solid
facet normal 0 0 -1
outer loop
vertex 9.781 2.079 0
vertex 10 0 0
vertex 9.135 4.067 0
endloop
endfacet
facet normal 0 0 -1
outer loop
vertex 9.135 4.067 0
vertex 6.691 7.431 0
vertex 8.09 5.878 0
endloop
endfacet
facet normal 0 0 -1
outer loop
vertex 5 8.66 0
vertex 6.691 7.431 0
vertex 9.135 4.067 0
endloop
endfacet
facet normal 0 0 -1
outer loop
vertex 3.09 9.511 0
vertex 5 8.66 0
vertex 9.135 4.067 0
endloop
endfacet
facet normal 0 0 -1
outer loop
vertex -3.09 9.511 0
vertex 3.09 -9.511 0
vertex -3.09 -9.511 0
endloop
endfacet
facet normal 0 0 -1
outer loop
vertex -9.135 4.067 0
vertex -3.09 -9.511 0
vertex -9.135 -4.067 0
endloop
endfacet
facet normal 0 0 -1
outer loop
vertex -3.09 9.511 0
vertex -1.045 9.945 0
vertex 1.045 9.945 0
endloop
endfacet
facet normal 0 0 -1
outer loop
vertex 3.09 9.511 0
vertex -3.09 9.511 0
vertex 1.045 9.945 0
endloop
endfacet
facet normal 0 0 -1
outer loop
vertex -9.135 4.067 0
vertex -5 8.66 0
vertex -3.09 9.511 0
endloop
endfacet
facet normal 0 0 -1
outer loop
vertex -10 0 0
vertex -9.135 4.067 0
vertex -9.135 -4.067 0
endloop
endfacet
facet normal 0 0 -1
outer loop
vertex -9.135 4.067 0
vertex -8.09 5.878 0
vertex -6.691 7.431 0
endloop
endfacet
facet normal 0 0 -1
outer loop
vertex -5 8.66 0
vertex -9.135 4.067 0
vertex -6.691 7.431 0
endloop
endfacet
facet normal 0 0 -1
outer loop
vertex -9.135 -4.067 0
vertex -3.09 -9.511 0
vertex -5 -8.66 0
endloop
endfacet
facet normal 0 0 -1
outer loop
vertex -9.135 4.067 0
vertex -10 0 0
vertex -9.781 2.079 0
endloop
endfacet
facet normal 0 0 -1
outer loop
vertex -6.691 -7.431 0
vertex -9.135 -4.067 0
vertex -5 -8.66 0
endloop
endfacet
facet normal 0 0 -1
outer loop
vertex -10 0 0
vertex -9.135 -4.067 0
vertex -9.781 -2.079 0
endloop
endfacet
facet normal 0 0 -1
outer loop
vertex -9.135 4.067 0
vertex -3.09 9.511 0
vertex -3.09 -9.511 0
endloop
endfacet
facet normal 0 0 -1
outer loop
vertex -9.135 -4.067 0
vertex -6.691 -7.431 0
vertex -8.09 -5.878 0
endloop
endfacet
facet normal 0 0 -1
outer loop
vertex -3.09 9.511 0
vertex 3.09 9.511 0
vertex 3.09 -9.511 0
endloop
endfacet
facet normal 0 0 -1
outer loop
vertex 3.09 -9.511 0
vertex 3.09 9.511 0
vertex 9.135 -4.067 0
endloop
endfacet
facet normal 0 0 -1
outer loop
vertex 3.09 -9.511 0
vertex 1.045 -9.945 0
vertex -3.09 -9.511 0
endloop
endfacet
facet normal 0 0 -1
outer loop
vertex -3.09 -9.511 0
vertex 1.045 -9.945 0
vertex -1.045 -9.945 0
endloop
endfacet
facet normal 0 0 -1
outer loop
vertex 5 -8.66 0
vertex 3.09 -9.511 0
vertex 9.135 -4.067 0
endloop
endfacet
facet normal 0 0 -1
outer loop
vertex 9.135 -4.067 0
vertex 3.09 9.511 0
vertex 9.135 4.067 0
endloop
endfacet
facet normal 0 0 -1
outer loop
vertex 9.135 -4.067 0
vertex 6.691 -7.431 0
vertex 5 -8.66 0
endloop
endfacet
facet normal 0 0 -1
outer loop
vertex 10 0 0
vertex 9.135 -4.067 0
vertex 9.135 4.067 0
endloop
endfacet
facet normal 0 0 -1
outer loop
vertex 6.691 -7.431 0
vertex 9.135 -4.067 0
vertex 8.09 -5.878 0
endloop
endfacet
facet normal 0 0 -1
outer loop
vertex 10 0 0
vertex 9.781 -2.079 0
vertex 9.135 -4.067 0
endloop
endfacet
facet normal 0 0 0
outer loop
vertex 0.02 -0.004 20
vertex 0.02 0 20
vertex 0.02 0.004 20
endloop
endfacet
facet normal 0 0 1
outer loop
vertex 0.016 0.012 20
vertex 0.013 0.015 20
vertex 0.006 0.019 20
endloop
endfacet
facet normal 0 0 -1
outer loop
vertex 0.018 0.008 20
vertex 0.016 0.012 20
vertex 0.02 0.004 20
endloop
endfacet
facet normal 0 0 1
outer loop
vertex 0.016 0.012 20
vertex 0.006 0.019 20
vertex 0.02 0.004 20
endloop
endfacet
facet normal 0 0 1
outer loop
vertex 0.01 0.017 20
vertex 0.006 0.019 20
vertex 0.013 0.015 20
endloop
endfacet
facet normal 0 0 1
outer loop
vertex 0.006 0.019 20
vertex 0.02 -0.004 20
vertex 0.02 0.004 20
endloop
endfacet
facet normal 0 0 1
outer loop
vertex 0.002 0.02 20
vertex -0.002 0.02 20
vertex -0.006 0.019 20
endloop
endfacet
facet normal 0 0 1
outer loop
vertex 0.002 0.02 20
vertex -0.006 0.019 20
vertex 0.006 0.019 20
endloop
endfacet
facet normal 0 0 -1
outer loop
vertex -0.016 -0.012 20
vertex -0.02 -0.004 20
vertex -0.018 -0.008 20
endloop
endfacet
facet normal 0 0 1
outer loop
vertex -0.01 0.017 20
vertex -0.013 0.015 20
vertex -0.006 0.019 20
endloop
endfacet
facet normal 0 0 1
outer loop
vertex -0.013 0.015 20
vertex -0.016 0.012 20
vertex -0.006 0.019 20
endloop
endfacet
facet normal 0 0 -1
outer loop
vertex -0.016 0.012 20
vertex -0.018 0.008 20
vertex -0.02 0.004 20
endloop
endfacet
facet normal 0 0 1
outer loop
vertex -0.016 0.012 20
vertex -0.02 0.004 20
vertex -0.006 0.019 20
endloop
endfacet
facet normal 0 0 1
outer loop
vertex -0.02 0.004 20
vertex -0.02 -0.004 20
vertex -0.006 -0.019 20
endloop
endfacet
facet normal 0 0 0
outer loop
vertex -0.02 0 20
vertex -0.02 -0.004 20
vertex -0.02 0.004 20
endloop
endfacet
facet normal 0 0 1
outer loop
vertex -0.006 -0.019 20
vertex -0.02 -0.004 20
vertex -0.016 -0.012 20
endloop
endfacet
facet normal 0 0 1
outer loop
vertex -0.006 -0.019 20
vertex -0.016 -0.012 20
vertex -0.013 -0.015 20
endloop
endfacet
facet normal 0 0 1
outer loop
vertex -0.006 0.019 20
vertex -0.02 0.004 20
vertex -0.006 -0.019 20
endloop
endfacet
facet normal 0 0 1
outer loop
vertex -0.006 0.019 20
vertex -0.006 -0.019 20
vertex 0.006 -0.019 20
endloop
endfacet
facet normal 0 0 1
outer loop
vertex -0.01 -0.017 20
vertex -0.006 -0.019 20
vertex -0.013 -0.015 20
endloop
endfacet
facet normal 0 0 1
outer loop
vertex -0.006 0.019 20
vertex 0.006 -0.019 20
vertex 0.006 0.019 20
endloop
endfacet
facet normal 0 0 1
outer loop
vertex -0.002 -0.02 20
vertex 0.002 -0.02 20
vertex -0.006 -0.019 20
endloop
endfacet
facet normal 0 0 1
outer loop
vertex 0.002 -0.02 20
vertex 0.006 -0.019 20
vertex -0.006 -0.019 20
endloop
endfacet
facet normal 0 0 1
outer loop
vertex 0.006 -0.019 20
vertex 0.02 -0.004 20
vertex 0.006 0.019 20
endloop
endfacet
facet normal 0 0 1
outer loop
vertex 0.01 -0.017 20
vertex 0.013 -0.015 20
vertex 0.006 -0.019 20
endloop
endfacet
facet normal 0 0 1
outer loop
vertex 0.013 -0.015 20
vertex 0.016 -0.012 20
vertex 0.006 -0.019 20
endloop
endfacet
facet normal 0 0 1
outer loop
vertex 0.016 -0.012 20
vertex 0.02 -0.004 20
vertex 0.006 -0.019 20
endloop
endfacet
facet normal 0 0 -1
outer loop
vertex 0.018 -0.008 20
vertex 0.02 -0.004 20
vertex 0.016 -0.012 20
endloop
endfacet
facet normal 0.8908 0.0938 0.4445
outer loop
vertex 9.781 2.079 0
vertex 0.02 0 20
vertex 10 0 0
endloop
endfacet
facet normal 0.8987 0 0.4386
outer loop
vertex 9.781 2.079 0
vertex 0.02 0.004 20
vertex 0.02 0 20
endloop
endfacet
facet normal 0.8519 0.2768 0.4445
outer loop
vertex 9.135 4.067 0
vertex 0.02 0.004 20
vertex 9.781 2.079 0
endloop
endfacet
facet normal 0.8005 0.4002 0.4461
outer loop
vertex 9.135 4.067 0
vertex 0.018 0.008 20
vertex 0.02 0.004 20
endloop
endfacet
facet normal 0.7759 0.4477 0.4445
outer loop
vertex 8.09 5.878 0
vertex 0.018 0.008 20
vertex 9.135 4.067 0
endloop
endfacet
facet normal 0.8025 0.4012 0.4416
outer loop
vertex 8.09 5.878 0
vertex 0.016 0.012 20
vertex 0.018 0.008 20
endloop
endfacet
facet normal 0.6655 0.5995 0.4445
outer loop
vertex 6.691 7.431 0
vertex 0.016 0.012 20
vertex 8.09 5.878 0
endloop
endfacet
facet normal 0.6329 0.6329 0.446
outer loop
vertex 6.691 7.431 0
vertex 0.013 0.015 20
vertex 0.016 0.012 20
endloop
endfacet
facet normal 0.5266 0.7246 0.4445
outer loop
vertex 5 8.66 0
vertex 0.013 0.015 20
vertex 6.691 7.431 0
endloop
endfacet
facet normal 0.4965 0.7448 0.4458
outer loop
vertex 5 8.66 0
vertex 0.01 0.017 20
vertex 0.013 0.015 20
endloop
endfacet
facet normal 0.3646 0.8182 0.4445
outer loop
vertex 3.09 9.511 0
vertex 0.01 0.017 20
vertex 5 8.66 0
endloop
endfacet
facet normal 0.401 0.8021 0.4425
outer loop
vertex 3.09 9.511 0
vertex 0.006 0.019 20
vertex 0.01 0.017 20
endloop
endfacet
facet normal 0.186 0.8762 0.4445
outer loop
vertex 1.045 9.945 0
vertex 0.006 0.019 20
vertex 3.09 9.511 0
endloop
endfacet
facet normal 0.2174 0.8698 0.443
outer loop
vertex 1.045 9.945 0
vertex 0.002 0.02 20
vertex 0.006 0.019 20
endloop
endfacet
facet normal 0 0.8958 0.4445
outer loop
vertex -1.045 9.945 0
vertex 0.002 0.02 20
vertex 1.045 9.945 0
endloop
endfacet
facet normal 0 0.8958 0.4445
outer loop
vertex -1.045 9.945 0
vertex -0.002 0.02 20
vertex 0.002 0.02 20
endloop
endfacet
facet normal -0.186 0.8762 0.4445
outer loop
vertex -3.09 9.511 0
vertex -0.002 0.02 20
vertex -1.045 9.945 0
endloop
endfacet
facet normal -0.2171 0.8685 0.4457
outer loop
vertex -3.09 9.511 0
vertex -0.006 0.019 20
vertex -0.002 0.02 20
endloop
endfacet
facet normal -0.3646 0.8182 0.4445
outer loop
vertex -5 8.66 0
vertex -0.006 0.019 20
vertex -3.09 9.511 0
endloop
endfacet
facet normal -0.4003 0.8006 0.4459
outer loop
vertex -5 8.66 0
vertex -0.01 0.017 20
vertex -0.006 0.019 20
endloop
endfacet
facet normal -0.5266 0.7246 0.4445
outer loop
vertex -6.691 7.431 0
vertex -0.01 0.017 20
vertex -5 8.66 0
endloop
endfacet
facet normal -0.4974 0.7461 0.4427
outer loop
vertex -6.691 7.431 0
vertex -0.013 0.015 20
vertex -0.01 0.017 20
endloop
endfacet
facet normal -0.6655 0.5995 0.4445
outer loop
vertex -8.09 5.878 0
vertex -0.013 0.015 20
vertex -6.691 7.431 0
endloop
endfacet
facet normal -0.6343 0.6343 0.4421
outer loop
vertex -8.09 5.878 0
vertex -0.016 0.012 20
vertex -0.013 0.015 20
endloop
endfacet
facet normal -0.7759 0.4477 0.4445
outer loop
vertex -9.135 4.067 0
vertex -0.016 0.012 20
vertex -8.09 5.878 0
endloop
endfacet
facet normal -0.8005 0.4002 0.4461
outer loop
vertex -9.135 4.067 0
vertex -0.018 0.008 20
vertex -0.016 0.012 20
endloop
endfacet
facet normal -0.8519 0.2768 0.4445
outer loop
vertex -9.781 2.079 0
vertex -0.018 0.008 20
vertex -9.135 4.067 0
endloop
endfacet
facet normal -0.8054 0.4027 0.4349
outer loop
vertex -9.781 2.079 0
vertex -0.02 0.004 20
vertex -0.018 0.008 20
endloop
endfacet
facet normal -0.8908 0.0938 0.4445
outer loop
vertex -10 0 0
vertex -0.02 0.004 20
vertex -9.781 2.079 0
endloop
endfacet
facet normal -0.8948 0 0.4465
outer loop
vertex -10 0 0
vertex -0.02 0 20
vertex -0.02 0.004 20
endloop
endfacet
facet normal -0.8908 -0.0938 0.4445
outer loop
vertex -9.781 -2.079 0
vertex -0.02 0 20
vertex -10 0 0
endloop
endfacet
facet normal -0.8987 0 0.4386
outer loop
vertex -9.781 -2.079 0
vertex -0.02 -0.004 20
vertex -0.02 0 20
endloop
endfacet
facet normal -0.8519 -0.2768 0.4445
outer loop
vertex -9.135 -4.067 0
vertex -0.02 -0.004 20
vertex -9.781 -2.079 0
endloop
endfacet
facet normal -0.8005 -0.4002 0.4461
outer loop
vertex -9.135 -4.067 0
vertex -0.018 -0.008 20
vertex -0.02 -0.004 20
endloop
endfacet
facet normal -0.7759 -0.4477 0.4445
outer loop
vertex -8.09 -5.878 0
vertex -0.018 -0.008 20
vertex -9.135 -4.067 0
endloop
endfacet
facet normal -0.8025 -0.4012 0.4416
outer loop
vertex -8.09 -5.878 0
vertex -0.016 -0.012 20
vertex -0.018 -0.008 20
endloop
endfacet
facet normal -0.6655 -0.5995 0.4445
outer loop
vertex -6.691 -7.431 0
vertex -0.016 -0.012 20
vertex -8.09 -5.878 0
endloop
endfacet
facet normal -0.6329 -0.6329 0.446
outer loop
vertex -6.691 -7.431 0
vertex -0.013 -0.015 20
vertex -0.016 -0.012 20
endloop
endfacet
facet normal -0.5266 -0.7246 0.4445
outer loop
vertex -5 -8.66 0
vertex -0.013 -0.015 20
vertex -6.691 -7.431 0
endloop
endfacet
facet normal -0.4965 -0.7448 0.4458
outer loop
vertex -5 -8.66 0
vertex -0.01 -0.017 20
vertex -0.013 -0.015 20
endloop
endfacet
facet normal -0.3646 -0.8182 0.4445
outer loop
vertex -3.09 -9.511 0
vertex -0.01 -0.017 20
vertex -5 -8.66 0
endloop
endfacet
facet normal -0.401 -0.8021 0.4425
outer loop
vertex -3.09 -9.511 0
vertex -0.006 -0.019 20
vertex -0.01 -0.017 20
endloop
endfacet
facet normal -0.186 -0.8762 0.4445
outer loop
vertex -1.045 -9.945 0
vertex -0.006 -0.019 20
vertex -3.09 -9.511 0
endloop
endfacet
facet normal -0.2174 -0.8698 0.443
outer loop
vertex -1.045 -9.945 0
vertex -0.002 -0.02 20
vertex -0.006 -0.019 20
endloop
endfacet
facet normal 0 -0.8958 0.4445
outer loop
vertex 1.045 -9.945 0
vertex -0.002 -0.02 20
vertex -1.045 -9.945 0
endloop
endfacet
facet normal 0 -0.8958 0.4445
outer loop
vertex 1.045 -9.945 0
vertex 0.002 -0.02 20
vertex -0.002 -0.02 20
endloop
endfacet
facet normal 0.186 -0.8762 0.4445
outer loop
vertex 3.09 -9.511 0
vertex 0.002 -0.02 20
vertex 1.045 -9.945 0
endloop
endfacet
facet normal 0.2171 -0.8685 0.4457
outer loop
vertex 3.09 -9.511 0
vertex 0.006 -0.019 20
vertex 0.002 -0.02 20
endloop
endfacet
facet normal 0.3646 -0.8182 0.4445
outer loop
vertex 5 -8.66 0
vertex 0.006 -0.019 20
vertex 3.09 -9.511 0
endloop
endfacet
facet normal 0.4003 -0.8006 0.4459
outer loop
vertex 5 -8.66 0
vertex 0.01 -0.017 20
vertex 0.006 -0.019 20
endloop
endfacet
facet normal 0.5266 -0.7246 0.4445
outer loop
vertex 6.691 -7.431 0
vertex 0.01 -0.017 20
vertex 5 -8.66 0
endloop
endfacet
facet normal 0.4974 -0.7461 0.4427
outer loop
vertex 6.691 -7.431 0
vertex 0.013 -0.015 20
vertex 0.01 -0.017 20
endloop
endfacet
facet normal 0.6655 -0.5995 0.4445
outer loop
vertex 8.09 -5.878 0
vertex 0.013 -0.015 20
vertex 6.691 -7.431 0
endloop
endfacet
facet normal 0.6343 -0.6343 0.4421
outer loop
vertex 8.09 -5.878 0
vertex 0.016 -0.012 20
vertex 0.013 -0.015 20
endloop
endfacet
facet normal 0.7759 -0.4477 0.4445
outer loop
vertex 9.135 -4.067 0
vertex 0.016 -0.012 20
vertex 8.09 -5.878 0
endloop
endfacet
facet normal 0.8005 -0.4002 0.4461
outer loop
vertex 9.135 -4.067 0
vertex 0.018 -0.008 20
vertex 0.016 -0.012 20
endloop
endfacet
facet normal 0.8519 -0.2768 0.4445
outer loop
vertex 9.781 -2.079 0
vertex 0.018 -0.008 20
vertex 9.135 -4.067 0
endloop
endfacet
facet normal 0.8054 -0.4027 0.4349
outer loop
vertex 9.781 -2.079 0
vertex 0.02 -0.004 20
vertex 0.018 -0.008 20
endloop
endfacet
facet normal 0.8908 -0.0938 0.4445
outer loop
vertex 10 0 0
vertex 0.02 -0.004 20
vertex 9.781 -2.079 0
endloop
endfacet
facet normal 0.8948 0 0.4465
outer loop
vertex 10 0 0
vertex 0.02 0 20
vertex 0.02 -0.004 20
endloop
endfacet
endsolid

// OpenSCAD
d=10;
h=20;

  minkowski(){
    linear_extrude(height=h*0.0001)
      offset(-d)
        import("logo2.dxf");
    
    linear_extrude(height=h,scale=h*0.0001)
      circle(d);
  }
